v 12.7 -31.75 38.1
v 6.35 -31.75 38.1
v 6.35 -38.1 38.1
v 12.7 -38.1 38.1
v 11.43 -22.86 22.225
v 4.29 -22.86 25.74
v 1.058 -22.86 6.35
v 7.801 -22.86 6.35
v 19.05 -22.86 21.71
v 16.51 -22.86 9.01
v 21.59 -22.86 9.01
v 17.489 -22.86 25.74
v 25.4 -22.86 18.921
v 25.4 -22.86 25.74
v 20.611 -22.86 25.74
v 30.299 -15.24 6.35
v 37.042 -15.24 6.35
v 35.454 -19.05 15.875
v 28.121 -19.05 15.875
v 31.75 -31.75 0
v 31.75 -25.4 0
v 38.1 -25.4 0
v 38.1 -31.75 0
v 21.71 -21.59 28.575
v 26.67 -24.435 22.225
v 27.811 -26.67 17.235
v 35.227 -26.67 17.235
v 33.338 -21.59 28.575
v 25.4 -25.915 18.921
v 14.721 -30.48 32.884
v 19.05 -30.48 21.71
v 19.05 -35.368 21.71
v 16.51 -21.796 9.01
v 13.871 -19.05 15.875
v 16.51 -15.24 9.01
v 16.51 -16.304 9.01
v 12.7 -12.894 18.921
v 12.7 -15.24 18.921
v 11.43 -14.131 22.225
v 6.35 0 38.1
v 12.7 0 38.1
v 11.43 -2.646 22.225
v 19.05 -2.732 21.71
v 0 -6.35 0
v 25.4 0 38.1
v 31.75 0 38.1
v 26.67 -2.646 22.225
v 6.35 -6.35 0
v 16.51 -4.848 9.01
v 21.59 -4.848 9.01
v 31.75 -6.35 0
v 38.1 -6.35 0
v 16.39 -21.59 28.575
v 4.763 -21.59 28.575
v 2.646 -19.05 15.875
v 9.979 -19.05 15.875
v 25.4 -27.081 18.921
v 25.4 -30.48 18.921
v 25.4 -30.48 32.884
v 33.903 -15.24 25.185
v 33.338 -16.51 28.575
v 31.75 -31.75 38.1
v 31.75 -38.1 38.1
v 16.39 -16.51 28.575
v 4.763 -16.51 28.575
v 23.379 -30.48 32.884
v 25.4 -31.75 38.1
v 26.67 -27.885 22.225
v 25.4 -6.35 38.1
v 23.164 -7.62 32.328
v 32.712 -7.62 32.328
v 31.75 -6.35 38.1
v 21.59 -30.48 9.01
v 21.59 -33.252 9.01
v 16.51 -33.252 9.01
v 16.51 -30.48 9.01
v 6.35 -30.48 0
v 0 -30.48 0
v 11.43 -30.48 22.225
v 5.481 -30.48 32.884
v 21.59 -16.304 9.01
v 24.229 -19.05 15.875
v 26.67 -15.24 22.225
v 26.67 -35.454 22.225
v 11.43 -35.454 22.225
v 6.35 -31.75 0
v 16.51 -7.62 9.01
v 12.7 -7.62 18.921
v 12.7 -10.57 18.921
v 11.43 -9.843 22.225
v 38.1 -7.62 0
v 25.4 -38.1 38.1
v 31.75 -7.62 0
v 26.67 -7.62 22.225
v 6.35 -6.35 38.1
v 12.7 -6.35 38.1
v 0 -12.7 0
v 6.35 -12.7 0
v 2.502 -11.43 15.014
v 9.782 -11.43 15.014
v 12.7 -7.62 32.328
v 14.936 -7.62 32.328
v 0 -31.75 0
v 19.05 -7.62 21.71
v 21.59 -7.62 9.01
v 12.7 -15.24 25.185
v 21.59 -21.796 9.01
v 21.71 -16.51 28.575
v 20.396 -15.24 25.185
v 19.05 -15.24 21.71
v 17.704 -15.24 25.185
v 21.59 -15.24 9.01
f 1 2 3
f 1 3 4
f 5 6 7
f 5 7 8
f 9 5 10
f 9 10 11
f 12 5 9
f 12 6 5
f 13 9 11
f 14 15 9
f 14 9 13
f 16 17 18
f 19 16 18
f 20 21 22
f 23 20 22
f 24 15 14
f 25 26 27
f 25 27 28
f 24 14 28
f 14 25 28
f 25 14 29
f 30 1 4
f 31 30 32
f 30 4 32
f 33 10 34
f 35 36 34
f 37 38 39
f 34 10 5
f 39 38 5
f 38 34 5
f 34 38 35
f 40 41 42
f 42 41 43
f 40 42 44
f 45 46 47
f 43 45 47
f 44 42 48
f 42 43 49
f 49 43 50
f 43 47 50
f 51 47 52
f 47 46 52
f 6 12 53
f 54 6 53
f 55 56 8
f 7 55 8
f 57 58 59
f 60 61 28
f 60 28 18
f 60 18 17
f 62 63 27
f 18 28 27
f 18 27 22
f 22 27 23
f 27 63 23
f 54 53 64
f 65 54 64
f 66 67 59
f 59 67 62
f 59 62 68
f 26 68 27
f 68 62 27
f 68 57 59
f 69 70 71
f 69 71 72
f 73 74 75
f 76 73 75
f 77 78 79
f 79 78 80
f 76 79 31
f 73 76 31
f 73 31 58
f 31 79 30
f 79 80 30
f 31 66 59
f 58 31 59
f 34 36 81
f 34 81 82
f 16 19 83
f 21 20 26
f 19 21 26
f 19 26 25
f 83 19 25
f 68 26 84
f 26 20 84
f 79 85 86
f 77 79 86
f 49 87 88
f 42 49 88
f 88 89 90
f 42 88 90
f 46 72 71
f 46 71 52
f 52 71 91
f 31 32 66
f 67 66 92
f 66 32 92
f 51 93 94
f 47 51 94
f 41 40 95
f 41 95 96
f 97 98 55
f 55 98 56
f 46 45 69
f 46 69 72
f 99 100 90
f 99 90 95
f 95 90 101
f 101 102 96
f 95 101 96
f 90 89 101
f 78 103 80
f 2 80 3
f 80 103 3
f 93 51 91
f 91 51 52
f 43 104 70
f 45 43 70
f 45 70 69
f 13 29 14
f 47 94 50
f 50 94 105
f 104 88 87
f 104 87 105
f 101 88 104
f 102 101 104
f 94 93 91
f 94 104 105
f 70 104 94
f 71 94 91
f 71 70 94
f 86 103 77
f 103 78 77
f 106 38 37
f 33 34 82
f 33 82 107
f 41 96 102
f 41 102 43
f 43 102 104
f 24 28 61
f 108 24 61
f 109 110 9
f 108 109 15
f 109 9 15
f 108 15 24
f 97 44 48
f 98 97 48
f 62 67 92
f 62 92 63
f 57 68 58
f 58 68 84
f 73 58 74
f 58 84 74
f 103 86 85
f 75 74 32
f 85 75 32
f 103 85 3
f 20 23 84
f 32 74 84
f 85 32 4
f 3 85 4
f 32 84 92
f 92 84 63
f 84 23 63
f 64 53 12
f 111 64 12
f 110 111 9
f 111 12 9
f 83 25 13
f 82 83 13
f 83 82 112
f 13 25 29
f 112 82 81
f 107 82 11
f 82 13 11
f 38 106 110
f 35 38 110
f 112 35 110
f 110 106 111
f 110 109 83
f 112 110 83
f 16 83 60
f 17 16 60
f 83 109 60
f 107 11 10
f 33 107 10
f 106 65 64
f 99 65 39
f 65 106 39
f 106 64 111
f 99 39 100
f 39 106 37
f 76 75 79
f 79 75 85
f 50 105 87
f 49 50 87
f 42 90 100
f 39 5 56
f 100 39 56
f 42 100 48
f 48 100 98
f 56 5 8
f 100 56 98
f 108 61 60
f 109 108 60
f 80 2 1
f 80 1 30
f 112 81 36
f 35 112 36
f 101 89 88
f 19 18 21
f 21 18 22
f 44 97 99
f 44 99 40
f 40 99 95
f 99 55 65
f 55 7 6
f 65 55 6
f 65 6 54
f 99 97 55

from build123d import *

# Parameters (mm, degrees)
F0_W      = 38.1
F0_H      = 38.1
F1_DEPTH  = 38.1
F6_DEPTH  = 38.1
F8_DEPTH  = 38.1
F9_W      = 25.4
F9_H      = 7.62
F10_DEPTH = 38.1


with BuildPart() as f1:
    # F0 (on Front) → F1 (new body)
    with BuildSketch(Plane.XZ):
        with Locations((19.05, 19.05)):
            Rectangle(F0_W, F0_H)
    extrude(amount=F1_DEPTH)

    # F5 (on offset) → F6 (cut)
    with BuildSketch(Plane.YZ.offset(38.1)):
        Polygon((-11.43, 15.013679), (-6.35, 38.1), (-31.75, 38.1), (-26.67, 17.235135), (-21.59, 28.575), (-16.51, 28.575), align=None)
        Polygon((0, 0), (0, 38.1), (-6.35, 0), align=None)
        Polygon((-25.4, 0), (-12.7, 0), (-19.05, 15.875), align=None)
        Polygon((-31.75, 0), (-38.1, 38.1), (-38.1, 0), align=None)
    extrude(amount=-F6_DEPTH, mode=Mode.SUBTRACT)

    # F7 (on offset) → F8 (cut)
    with BuildSketch(Plane.XZ.offset(38.1)):
        Polygon((0, 38.1), (0, 0), (6.35, 38.1), align=None)
        Polygon((25.4, 38.1), (12.7, 38.1), (19.05, 21.709906), align=None)
        Polygon((31.75, 38.1), (38.1, 0), (38.1, 38.1), align=None)
        Polygon((11.43, 22.225), (6.35, 0), (31.75, 0), (26.67, 22.225), (21.59, 9.009906), (16.51, 9.009906), align=None)
    extrude(amount=-F8_DEPTH, mode=Mode.SUBTRACT)

    # F9 (on offset) → F10 (cut)
    with BuildSketch(Plane.XY.offset(38.1)):
        with Locations((12.7, -26.67)):
            Rectangle(F9_W, F9_H)
        with Locations((25.4, -11.43)):
            Rectangle(F9_W, F9_H)
    extrude(amount=-F10_DEPTH, mode=Mode.SUBTRACT)


solid = f1.part
